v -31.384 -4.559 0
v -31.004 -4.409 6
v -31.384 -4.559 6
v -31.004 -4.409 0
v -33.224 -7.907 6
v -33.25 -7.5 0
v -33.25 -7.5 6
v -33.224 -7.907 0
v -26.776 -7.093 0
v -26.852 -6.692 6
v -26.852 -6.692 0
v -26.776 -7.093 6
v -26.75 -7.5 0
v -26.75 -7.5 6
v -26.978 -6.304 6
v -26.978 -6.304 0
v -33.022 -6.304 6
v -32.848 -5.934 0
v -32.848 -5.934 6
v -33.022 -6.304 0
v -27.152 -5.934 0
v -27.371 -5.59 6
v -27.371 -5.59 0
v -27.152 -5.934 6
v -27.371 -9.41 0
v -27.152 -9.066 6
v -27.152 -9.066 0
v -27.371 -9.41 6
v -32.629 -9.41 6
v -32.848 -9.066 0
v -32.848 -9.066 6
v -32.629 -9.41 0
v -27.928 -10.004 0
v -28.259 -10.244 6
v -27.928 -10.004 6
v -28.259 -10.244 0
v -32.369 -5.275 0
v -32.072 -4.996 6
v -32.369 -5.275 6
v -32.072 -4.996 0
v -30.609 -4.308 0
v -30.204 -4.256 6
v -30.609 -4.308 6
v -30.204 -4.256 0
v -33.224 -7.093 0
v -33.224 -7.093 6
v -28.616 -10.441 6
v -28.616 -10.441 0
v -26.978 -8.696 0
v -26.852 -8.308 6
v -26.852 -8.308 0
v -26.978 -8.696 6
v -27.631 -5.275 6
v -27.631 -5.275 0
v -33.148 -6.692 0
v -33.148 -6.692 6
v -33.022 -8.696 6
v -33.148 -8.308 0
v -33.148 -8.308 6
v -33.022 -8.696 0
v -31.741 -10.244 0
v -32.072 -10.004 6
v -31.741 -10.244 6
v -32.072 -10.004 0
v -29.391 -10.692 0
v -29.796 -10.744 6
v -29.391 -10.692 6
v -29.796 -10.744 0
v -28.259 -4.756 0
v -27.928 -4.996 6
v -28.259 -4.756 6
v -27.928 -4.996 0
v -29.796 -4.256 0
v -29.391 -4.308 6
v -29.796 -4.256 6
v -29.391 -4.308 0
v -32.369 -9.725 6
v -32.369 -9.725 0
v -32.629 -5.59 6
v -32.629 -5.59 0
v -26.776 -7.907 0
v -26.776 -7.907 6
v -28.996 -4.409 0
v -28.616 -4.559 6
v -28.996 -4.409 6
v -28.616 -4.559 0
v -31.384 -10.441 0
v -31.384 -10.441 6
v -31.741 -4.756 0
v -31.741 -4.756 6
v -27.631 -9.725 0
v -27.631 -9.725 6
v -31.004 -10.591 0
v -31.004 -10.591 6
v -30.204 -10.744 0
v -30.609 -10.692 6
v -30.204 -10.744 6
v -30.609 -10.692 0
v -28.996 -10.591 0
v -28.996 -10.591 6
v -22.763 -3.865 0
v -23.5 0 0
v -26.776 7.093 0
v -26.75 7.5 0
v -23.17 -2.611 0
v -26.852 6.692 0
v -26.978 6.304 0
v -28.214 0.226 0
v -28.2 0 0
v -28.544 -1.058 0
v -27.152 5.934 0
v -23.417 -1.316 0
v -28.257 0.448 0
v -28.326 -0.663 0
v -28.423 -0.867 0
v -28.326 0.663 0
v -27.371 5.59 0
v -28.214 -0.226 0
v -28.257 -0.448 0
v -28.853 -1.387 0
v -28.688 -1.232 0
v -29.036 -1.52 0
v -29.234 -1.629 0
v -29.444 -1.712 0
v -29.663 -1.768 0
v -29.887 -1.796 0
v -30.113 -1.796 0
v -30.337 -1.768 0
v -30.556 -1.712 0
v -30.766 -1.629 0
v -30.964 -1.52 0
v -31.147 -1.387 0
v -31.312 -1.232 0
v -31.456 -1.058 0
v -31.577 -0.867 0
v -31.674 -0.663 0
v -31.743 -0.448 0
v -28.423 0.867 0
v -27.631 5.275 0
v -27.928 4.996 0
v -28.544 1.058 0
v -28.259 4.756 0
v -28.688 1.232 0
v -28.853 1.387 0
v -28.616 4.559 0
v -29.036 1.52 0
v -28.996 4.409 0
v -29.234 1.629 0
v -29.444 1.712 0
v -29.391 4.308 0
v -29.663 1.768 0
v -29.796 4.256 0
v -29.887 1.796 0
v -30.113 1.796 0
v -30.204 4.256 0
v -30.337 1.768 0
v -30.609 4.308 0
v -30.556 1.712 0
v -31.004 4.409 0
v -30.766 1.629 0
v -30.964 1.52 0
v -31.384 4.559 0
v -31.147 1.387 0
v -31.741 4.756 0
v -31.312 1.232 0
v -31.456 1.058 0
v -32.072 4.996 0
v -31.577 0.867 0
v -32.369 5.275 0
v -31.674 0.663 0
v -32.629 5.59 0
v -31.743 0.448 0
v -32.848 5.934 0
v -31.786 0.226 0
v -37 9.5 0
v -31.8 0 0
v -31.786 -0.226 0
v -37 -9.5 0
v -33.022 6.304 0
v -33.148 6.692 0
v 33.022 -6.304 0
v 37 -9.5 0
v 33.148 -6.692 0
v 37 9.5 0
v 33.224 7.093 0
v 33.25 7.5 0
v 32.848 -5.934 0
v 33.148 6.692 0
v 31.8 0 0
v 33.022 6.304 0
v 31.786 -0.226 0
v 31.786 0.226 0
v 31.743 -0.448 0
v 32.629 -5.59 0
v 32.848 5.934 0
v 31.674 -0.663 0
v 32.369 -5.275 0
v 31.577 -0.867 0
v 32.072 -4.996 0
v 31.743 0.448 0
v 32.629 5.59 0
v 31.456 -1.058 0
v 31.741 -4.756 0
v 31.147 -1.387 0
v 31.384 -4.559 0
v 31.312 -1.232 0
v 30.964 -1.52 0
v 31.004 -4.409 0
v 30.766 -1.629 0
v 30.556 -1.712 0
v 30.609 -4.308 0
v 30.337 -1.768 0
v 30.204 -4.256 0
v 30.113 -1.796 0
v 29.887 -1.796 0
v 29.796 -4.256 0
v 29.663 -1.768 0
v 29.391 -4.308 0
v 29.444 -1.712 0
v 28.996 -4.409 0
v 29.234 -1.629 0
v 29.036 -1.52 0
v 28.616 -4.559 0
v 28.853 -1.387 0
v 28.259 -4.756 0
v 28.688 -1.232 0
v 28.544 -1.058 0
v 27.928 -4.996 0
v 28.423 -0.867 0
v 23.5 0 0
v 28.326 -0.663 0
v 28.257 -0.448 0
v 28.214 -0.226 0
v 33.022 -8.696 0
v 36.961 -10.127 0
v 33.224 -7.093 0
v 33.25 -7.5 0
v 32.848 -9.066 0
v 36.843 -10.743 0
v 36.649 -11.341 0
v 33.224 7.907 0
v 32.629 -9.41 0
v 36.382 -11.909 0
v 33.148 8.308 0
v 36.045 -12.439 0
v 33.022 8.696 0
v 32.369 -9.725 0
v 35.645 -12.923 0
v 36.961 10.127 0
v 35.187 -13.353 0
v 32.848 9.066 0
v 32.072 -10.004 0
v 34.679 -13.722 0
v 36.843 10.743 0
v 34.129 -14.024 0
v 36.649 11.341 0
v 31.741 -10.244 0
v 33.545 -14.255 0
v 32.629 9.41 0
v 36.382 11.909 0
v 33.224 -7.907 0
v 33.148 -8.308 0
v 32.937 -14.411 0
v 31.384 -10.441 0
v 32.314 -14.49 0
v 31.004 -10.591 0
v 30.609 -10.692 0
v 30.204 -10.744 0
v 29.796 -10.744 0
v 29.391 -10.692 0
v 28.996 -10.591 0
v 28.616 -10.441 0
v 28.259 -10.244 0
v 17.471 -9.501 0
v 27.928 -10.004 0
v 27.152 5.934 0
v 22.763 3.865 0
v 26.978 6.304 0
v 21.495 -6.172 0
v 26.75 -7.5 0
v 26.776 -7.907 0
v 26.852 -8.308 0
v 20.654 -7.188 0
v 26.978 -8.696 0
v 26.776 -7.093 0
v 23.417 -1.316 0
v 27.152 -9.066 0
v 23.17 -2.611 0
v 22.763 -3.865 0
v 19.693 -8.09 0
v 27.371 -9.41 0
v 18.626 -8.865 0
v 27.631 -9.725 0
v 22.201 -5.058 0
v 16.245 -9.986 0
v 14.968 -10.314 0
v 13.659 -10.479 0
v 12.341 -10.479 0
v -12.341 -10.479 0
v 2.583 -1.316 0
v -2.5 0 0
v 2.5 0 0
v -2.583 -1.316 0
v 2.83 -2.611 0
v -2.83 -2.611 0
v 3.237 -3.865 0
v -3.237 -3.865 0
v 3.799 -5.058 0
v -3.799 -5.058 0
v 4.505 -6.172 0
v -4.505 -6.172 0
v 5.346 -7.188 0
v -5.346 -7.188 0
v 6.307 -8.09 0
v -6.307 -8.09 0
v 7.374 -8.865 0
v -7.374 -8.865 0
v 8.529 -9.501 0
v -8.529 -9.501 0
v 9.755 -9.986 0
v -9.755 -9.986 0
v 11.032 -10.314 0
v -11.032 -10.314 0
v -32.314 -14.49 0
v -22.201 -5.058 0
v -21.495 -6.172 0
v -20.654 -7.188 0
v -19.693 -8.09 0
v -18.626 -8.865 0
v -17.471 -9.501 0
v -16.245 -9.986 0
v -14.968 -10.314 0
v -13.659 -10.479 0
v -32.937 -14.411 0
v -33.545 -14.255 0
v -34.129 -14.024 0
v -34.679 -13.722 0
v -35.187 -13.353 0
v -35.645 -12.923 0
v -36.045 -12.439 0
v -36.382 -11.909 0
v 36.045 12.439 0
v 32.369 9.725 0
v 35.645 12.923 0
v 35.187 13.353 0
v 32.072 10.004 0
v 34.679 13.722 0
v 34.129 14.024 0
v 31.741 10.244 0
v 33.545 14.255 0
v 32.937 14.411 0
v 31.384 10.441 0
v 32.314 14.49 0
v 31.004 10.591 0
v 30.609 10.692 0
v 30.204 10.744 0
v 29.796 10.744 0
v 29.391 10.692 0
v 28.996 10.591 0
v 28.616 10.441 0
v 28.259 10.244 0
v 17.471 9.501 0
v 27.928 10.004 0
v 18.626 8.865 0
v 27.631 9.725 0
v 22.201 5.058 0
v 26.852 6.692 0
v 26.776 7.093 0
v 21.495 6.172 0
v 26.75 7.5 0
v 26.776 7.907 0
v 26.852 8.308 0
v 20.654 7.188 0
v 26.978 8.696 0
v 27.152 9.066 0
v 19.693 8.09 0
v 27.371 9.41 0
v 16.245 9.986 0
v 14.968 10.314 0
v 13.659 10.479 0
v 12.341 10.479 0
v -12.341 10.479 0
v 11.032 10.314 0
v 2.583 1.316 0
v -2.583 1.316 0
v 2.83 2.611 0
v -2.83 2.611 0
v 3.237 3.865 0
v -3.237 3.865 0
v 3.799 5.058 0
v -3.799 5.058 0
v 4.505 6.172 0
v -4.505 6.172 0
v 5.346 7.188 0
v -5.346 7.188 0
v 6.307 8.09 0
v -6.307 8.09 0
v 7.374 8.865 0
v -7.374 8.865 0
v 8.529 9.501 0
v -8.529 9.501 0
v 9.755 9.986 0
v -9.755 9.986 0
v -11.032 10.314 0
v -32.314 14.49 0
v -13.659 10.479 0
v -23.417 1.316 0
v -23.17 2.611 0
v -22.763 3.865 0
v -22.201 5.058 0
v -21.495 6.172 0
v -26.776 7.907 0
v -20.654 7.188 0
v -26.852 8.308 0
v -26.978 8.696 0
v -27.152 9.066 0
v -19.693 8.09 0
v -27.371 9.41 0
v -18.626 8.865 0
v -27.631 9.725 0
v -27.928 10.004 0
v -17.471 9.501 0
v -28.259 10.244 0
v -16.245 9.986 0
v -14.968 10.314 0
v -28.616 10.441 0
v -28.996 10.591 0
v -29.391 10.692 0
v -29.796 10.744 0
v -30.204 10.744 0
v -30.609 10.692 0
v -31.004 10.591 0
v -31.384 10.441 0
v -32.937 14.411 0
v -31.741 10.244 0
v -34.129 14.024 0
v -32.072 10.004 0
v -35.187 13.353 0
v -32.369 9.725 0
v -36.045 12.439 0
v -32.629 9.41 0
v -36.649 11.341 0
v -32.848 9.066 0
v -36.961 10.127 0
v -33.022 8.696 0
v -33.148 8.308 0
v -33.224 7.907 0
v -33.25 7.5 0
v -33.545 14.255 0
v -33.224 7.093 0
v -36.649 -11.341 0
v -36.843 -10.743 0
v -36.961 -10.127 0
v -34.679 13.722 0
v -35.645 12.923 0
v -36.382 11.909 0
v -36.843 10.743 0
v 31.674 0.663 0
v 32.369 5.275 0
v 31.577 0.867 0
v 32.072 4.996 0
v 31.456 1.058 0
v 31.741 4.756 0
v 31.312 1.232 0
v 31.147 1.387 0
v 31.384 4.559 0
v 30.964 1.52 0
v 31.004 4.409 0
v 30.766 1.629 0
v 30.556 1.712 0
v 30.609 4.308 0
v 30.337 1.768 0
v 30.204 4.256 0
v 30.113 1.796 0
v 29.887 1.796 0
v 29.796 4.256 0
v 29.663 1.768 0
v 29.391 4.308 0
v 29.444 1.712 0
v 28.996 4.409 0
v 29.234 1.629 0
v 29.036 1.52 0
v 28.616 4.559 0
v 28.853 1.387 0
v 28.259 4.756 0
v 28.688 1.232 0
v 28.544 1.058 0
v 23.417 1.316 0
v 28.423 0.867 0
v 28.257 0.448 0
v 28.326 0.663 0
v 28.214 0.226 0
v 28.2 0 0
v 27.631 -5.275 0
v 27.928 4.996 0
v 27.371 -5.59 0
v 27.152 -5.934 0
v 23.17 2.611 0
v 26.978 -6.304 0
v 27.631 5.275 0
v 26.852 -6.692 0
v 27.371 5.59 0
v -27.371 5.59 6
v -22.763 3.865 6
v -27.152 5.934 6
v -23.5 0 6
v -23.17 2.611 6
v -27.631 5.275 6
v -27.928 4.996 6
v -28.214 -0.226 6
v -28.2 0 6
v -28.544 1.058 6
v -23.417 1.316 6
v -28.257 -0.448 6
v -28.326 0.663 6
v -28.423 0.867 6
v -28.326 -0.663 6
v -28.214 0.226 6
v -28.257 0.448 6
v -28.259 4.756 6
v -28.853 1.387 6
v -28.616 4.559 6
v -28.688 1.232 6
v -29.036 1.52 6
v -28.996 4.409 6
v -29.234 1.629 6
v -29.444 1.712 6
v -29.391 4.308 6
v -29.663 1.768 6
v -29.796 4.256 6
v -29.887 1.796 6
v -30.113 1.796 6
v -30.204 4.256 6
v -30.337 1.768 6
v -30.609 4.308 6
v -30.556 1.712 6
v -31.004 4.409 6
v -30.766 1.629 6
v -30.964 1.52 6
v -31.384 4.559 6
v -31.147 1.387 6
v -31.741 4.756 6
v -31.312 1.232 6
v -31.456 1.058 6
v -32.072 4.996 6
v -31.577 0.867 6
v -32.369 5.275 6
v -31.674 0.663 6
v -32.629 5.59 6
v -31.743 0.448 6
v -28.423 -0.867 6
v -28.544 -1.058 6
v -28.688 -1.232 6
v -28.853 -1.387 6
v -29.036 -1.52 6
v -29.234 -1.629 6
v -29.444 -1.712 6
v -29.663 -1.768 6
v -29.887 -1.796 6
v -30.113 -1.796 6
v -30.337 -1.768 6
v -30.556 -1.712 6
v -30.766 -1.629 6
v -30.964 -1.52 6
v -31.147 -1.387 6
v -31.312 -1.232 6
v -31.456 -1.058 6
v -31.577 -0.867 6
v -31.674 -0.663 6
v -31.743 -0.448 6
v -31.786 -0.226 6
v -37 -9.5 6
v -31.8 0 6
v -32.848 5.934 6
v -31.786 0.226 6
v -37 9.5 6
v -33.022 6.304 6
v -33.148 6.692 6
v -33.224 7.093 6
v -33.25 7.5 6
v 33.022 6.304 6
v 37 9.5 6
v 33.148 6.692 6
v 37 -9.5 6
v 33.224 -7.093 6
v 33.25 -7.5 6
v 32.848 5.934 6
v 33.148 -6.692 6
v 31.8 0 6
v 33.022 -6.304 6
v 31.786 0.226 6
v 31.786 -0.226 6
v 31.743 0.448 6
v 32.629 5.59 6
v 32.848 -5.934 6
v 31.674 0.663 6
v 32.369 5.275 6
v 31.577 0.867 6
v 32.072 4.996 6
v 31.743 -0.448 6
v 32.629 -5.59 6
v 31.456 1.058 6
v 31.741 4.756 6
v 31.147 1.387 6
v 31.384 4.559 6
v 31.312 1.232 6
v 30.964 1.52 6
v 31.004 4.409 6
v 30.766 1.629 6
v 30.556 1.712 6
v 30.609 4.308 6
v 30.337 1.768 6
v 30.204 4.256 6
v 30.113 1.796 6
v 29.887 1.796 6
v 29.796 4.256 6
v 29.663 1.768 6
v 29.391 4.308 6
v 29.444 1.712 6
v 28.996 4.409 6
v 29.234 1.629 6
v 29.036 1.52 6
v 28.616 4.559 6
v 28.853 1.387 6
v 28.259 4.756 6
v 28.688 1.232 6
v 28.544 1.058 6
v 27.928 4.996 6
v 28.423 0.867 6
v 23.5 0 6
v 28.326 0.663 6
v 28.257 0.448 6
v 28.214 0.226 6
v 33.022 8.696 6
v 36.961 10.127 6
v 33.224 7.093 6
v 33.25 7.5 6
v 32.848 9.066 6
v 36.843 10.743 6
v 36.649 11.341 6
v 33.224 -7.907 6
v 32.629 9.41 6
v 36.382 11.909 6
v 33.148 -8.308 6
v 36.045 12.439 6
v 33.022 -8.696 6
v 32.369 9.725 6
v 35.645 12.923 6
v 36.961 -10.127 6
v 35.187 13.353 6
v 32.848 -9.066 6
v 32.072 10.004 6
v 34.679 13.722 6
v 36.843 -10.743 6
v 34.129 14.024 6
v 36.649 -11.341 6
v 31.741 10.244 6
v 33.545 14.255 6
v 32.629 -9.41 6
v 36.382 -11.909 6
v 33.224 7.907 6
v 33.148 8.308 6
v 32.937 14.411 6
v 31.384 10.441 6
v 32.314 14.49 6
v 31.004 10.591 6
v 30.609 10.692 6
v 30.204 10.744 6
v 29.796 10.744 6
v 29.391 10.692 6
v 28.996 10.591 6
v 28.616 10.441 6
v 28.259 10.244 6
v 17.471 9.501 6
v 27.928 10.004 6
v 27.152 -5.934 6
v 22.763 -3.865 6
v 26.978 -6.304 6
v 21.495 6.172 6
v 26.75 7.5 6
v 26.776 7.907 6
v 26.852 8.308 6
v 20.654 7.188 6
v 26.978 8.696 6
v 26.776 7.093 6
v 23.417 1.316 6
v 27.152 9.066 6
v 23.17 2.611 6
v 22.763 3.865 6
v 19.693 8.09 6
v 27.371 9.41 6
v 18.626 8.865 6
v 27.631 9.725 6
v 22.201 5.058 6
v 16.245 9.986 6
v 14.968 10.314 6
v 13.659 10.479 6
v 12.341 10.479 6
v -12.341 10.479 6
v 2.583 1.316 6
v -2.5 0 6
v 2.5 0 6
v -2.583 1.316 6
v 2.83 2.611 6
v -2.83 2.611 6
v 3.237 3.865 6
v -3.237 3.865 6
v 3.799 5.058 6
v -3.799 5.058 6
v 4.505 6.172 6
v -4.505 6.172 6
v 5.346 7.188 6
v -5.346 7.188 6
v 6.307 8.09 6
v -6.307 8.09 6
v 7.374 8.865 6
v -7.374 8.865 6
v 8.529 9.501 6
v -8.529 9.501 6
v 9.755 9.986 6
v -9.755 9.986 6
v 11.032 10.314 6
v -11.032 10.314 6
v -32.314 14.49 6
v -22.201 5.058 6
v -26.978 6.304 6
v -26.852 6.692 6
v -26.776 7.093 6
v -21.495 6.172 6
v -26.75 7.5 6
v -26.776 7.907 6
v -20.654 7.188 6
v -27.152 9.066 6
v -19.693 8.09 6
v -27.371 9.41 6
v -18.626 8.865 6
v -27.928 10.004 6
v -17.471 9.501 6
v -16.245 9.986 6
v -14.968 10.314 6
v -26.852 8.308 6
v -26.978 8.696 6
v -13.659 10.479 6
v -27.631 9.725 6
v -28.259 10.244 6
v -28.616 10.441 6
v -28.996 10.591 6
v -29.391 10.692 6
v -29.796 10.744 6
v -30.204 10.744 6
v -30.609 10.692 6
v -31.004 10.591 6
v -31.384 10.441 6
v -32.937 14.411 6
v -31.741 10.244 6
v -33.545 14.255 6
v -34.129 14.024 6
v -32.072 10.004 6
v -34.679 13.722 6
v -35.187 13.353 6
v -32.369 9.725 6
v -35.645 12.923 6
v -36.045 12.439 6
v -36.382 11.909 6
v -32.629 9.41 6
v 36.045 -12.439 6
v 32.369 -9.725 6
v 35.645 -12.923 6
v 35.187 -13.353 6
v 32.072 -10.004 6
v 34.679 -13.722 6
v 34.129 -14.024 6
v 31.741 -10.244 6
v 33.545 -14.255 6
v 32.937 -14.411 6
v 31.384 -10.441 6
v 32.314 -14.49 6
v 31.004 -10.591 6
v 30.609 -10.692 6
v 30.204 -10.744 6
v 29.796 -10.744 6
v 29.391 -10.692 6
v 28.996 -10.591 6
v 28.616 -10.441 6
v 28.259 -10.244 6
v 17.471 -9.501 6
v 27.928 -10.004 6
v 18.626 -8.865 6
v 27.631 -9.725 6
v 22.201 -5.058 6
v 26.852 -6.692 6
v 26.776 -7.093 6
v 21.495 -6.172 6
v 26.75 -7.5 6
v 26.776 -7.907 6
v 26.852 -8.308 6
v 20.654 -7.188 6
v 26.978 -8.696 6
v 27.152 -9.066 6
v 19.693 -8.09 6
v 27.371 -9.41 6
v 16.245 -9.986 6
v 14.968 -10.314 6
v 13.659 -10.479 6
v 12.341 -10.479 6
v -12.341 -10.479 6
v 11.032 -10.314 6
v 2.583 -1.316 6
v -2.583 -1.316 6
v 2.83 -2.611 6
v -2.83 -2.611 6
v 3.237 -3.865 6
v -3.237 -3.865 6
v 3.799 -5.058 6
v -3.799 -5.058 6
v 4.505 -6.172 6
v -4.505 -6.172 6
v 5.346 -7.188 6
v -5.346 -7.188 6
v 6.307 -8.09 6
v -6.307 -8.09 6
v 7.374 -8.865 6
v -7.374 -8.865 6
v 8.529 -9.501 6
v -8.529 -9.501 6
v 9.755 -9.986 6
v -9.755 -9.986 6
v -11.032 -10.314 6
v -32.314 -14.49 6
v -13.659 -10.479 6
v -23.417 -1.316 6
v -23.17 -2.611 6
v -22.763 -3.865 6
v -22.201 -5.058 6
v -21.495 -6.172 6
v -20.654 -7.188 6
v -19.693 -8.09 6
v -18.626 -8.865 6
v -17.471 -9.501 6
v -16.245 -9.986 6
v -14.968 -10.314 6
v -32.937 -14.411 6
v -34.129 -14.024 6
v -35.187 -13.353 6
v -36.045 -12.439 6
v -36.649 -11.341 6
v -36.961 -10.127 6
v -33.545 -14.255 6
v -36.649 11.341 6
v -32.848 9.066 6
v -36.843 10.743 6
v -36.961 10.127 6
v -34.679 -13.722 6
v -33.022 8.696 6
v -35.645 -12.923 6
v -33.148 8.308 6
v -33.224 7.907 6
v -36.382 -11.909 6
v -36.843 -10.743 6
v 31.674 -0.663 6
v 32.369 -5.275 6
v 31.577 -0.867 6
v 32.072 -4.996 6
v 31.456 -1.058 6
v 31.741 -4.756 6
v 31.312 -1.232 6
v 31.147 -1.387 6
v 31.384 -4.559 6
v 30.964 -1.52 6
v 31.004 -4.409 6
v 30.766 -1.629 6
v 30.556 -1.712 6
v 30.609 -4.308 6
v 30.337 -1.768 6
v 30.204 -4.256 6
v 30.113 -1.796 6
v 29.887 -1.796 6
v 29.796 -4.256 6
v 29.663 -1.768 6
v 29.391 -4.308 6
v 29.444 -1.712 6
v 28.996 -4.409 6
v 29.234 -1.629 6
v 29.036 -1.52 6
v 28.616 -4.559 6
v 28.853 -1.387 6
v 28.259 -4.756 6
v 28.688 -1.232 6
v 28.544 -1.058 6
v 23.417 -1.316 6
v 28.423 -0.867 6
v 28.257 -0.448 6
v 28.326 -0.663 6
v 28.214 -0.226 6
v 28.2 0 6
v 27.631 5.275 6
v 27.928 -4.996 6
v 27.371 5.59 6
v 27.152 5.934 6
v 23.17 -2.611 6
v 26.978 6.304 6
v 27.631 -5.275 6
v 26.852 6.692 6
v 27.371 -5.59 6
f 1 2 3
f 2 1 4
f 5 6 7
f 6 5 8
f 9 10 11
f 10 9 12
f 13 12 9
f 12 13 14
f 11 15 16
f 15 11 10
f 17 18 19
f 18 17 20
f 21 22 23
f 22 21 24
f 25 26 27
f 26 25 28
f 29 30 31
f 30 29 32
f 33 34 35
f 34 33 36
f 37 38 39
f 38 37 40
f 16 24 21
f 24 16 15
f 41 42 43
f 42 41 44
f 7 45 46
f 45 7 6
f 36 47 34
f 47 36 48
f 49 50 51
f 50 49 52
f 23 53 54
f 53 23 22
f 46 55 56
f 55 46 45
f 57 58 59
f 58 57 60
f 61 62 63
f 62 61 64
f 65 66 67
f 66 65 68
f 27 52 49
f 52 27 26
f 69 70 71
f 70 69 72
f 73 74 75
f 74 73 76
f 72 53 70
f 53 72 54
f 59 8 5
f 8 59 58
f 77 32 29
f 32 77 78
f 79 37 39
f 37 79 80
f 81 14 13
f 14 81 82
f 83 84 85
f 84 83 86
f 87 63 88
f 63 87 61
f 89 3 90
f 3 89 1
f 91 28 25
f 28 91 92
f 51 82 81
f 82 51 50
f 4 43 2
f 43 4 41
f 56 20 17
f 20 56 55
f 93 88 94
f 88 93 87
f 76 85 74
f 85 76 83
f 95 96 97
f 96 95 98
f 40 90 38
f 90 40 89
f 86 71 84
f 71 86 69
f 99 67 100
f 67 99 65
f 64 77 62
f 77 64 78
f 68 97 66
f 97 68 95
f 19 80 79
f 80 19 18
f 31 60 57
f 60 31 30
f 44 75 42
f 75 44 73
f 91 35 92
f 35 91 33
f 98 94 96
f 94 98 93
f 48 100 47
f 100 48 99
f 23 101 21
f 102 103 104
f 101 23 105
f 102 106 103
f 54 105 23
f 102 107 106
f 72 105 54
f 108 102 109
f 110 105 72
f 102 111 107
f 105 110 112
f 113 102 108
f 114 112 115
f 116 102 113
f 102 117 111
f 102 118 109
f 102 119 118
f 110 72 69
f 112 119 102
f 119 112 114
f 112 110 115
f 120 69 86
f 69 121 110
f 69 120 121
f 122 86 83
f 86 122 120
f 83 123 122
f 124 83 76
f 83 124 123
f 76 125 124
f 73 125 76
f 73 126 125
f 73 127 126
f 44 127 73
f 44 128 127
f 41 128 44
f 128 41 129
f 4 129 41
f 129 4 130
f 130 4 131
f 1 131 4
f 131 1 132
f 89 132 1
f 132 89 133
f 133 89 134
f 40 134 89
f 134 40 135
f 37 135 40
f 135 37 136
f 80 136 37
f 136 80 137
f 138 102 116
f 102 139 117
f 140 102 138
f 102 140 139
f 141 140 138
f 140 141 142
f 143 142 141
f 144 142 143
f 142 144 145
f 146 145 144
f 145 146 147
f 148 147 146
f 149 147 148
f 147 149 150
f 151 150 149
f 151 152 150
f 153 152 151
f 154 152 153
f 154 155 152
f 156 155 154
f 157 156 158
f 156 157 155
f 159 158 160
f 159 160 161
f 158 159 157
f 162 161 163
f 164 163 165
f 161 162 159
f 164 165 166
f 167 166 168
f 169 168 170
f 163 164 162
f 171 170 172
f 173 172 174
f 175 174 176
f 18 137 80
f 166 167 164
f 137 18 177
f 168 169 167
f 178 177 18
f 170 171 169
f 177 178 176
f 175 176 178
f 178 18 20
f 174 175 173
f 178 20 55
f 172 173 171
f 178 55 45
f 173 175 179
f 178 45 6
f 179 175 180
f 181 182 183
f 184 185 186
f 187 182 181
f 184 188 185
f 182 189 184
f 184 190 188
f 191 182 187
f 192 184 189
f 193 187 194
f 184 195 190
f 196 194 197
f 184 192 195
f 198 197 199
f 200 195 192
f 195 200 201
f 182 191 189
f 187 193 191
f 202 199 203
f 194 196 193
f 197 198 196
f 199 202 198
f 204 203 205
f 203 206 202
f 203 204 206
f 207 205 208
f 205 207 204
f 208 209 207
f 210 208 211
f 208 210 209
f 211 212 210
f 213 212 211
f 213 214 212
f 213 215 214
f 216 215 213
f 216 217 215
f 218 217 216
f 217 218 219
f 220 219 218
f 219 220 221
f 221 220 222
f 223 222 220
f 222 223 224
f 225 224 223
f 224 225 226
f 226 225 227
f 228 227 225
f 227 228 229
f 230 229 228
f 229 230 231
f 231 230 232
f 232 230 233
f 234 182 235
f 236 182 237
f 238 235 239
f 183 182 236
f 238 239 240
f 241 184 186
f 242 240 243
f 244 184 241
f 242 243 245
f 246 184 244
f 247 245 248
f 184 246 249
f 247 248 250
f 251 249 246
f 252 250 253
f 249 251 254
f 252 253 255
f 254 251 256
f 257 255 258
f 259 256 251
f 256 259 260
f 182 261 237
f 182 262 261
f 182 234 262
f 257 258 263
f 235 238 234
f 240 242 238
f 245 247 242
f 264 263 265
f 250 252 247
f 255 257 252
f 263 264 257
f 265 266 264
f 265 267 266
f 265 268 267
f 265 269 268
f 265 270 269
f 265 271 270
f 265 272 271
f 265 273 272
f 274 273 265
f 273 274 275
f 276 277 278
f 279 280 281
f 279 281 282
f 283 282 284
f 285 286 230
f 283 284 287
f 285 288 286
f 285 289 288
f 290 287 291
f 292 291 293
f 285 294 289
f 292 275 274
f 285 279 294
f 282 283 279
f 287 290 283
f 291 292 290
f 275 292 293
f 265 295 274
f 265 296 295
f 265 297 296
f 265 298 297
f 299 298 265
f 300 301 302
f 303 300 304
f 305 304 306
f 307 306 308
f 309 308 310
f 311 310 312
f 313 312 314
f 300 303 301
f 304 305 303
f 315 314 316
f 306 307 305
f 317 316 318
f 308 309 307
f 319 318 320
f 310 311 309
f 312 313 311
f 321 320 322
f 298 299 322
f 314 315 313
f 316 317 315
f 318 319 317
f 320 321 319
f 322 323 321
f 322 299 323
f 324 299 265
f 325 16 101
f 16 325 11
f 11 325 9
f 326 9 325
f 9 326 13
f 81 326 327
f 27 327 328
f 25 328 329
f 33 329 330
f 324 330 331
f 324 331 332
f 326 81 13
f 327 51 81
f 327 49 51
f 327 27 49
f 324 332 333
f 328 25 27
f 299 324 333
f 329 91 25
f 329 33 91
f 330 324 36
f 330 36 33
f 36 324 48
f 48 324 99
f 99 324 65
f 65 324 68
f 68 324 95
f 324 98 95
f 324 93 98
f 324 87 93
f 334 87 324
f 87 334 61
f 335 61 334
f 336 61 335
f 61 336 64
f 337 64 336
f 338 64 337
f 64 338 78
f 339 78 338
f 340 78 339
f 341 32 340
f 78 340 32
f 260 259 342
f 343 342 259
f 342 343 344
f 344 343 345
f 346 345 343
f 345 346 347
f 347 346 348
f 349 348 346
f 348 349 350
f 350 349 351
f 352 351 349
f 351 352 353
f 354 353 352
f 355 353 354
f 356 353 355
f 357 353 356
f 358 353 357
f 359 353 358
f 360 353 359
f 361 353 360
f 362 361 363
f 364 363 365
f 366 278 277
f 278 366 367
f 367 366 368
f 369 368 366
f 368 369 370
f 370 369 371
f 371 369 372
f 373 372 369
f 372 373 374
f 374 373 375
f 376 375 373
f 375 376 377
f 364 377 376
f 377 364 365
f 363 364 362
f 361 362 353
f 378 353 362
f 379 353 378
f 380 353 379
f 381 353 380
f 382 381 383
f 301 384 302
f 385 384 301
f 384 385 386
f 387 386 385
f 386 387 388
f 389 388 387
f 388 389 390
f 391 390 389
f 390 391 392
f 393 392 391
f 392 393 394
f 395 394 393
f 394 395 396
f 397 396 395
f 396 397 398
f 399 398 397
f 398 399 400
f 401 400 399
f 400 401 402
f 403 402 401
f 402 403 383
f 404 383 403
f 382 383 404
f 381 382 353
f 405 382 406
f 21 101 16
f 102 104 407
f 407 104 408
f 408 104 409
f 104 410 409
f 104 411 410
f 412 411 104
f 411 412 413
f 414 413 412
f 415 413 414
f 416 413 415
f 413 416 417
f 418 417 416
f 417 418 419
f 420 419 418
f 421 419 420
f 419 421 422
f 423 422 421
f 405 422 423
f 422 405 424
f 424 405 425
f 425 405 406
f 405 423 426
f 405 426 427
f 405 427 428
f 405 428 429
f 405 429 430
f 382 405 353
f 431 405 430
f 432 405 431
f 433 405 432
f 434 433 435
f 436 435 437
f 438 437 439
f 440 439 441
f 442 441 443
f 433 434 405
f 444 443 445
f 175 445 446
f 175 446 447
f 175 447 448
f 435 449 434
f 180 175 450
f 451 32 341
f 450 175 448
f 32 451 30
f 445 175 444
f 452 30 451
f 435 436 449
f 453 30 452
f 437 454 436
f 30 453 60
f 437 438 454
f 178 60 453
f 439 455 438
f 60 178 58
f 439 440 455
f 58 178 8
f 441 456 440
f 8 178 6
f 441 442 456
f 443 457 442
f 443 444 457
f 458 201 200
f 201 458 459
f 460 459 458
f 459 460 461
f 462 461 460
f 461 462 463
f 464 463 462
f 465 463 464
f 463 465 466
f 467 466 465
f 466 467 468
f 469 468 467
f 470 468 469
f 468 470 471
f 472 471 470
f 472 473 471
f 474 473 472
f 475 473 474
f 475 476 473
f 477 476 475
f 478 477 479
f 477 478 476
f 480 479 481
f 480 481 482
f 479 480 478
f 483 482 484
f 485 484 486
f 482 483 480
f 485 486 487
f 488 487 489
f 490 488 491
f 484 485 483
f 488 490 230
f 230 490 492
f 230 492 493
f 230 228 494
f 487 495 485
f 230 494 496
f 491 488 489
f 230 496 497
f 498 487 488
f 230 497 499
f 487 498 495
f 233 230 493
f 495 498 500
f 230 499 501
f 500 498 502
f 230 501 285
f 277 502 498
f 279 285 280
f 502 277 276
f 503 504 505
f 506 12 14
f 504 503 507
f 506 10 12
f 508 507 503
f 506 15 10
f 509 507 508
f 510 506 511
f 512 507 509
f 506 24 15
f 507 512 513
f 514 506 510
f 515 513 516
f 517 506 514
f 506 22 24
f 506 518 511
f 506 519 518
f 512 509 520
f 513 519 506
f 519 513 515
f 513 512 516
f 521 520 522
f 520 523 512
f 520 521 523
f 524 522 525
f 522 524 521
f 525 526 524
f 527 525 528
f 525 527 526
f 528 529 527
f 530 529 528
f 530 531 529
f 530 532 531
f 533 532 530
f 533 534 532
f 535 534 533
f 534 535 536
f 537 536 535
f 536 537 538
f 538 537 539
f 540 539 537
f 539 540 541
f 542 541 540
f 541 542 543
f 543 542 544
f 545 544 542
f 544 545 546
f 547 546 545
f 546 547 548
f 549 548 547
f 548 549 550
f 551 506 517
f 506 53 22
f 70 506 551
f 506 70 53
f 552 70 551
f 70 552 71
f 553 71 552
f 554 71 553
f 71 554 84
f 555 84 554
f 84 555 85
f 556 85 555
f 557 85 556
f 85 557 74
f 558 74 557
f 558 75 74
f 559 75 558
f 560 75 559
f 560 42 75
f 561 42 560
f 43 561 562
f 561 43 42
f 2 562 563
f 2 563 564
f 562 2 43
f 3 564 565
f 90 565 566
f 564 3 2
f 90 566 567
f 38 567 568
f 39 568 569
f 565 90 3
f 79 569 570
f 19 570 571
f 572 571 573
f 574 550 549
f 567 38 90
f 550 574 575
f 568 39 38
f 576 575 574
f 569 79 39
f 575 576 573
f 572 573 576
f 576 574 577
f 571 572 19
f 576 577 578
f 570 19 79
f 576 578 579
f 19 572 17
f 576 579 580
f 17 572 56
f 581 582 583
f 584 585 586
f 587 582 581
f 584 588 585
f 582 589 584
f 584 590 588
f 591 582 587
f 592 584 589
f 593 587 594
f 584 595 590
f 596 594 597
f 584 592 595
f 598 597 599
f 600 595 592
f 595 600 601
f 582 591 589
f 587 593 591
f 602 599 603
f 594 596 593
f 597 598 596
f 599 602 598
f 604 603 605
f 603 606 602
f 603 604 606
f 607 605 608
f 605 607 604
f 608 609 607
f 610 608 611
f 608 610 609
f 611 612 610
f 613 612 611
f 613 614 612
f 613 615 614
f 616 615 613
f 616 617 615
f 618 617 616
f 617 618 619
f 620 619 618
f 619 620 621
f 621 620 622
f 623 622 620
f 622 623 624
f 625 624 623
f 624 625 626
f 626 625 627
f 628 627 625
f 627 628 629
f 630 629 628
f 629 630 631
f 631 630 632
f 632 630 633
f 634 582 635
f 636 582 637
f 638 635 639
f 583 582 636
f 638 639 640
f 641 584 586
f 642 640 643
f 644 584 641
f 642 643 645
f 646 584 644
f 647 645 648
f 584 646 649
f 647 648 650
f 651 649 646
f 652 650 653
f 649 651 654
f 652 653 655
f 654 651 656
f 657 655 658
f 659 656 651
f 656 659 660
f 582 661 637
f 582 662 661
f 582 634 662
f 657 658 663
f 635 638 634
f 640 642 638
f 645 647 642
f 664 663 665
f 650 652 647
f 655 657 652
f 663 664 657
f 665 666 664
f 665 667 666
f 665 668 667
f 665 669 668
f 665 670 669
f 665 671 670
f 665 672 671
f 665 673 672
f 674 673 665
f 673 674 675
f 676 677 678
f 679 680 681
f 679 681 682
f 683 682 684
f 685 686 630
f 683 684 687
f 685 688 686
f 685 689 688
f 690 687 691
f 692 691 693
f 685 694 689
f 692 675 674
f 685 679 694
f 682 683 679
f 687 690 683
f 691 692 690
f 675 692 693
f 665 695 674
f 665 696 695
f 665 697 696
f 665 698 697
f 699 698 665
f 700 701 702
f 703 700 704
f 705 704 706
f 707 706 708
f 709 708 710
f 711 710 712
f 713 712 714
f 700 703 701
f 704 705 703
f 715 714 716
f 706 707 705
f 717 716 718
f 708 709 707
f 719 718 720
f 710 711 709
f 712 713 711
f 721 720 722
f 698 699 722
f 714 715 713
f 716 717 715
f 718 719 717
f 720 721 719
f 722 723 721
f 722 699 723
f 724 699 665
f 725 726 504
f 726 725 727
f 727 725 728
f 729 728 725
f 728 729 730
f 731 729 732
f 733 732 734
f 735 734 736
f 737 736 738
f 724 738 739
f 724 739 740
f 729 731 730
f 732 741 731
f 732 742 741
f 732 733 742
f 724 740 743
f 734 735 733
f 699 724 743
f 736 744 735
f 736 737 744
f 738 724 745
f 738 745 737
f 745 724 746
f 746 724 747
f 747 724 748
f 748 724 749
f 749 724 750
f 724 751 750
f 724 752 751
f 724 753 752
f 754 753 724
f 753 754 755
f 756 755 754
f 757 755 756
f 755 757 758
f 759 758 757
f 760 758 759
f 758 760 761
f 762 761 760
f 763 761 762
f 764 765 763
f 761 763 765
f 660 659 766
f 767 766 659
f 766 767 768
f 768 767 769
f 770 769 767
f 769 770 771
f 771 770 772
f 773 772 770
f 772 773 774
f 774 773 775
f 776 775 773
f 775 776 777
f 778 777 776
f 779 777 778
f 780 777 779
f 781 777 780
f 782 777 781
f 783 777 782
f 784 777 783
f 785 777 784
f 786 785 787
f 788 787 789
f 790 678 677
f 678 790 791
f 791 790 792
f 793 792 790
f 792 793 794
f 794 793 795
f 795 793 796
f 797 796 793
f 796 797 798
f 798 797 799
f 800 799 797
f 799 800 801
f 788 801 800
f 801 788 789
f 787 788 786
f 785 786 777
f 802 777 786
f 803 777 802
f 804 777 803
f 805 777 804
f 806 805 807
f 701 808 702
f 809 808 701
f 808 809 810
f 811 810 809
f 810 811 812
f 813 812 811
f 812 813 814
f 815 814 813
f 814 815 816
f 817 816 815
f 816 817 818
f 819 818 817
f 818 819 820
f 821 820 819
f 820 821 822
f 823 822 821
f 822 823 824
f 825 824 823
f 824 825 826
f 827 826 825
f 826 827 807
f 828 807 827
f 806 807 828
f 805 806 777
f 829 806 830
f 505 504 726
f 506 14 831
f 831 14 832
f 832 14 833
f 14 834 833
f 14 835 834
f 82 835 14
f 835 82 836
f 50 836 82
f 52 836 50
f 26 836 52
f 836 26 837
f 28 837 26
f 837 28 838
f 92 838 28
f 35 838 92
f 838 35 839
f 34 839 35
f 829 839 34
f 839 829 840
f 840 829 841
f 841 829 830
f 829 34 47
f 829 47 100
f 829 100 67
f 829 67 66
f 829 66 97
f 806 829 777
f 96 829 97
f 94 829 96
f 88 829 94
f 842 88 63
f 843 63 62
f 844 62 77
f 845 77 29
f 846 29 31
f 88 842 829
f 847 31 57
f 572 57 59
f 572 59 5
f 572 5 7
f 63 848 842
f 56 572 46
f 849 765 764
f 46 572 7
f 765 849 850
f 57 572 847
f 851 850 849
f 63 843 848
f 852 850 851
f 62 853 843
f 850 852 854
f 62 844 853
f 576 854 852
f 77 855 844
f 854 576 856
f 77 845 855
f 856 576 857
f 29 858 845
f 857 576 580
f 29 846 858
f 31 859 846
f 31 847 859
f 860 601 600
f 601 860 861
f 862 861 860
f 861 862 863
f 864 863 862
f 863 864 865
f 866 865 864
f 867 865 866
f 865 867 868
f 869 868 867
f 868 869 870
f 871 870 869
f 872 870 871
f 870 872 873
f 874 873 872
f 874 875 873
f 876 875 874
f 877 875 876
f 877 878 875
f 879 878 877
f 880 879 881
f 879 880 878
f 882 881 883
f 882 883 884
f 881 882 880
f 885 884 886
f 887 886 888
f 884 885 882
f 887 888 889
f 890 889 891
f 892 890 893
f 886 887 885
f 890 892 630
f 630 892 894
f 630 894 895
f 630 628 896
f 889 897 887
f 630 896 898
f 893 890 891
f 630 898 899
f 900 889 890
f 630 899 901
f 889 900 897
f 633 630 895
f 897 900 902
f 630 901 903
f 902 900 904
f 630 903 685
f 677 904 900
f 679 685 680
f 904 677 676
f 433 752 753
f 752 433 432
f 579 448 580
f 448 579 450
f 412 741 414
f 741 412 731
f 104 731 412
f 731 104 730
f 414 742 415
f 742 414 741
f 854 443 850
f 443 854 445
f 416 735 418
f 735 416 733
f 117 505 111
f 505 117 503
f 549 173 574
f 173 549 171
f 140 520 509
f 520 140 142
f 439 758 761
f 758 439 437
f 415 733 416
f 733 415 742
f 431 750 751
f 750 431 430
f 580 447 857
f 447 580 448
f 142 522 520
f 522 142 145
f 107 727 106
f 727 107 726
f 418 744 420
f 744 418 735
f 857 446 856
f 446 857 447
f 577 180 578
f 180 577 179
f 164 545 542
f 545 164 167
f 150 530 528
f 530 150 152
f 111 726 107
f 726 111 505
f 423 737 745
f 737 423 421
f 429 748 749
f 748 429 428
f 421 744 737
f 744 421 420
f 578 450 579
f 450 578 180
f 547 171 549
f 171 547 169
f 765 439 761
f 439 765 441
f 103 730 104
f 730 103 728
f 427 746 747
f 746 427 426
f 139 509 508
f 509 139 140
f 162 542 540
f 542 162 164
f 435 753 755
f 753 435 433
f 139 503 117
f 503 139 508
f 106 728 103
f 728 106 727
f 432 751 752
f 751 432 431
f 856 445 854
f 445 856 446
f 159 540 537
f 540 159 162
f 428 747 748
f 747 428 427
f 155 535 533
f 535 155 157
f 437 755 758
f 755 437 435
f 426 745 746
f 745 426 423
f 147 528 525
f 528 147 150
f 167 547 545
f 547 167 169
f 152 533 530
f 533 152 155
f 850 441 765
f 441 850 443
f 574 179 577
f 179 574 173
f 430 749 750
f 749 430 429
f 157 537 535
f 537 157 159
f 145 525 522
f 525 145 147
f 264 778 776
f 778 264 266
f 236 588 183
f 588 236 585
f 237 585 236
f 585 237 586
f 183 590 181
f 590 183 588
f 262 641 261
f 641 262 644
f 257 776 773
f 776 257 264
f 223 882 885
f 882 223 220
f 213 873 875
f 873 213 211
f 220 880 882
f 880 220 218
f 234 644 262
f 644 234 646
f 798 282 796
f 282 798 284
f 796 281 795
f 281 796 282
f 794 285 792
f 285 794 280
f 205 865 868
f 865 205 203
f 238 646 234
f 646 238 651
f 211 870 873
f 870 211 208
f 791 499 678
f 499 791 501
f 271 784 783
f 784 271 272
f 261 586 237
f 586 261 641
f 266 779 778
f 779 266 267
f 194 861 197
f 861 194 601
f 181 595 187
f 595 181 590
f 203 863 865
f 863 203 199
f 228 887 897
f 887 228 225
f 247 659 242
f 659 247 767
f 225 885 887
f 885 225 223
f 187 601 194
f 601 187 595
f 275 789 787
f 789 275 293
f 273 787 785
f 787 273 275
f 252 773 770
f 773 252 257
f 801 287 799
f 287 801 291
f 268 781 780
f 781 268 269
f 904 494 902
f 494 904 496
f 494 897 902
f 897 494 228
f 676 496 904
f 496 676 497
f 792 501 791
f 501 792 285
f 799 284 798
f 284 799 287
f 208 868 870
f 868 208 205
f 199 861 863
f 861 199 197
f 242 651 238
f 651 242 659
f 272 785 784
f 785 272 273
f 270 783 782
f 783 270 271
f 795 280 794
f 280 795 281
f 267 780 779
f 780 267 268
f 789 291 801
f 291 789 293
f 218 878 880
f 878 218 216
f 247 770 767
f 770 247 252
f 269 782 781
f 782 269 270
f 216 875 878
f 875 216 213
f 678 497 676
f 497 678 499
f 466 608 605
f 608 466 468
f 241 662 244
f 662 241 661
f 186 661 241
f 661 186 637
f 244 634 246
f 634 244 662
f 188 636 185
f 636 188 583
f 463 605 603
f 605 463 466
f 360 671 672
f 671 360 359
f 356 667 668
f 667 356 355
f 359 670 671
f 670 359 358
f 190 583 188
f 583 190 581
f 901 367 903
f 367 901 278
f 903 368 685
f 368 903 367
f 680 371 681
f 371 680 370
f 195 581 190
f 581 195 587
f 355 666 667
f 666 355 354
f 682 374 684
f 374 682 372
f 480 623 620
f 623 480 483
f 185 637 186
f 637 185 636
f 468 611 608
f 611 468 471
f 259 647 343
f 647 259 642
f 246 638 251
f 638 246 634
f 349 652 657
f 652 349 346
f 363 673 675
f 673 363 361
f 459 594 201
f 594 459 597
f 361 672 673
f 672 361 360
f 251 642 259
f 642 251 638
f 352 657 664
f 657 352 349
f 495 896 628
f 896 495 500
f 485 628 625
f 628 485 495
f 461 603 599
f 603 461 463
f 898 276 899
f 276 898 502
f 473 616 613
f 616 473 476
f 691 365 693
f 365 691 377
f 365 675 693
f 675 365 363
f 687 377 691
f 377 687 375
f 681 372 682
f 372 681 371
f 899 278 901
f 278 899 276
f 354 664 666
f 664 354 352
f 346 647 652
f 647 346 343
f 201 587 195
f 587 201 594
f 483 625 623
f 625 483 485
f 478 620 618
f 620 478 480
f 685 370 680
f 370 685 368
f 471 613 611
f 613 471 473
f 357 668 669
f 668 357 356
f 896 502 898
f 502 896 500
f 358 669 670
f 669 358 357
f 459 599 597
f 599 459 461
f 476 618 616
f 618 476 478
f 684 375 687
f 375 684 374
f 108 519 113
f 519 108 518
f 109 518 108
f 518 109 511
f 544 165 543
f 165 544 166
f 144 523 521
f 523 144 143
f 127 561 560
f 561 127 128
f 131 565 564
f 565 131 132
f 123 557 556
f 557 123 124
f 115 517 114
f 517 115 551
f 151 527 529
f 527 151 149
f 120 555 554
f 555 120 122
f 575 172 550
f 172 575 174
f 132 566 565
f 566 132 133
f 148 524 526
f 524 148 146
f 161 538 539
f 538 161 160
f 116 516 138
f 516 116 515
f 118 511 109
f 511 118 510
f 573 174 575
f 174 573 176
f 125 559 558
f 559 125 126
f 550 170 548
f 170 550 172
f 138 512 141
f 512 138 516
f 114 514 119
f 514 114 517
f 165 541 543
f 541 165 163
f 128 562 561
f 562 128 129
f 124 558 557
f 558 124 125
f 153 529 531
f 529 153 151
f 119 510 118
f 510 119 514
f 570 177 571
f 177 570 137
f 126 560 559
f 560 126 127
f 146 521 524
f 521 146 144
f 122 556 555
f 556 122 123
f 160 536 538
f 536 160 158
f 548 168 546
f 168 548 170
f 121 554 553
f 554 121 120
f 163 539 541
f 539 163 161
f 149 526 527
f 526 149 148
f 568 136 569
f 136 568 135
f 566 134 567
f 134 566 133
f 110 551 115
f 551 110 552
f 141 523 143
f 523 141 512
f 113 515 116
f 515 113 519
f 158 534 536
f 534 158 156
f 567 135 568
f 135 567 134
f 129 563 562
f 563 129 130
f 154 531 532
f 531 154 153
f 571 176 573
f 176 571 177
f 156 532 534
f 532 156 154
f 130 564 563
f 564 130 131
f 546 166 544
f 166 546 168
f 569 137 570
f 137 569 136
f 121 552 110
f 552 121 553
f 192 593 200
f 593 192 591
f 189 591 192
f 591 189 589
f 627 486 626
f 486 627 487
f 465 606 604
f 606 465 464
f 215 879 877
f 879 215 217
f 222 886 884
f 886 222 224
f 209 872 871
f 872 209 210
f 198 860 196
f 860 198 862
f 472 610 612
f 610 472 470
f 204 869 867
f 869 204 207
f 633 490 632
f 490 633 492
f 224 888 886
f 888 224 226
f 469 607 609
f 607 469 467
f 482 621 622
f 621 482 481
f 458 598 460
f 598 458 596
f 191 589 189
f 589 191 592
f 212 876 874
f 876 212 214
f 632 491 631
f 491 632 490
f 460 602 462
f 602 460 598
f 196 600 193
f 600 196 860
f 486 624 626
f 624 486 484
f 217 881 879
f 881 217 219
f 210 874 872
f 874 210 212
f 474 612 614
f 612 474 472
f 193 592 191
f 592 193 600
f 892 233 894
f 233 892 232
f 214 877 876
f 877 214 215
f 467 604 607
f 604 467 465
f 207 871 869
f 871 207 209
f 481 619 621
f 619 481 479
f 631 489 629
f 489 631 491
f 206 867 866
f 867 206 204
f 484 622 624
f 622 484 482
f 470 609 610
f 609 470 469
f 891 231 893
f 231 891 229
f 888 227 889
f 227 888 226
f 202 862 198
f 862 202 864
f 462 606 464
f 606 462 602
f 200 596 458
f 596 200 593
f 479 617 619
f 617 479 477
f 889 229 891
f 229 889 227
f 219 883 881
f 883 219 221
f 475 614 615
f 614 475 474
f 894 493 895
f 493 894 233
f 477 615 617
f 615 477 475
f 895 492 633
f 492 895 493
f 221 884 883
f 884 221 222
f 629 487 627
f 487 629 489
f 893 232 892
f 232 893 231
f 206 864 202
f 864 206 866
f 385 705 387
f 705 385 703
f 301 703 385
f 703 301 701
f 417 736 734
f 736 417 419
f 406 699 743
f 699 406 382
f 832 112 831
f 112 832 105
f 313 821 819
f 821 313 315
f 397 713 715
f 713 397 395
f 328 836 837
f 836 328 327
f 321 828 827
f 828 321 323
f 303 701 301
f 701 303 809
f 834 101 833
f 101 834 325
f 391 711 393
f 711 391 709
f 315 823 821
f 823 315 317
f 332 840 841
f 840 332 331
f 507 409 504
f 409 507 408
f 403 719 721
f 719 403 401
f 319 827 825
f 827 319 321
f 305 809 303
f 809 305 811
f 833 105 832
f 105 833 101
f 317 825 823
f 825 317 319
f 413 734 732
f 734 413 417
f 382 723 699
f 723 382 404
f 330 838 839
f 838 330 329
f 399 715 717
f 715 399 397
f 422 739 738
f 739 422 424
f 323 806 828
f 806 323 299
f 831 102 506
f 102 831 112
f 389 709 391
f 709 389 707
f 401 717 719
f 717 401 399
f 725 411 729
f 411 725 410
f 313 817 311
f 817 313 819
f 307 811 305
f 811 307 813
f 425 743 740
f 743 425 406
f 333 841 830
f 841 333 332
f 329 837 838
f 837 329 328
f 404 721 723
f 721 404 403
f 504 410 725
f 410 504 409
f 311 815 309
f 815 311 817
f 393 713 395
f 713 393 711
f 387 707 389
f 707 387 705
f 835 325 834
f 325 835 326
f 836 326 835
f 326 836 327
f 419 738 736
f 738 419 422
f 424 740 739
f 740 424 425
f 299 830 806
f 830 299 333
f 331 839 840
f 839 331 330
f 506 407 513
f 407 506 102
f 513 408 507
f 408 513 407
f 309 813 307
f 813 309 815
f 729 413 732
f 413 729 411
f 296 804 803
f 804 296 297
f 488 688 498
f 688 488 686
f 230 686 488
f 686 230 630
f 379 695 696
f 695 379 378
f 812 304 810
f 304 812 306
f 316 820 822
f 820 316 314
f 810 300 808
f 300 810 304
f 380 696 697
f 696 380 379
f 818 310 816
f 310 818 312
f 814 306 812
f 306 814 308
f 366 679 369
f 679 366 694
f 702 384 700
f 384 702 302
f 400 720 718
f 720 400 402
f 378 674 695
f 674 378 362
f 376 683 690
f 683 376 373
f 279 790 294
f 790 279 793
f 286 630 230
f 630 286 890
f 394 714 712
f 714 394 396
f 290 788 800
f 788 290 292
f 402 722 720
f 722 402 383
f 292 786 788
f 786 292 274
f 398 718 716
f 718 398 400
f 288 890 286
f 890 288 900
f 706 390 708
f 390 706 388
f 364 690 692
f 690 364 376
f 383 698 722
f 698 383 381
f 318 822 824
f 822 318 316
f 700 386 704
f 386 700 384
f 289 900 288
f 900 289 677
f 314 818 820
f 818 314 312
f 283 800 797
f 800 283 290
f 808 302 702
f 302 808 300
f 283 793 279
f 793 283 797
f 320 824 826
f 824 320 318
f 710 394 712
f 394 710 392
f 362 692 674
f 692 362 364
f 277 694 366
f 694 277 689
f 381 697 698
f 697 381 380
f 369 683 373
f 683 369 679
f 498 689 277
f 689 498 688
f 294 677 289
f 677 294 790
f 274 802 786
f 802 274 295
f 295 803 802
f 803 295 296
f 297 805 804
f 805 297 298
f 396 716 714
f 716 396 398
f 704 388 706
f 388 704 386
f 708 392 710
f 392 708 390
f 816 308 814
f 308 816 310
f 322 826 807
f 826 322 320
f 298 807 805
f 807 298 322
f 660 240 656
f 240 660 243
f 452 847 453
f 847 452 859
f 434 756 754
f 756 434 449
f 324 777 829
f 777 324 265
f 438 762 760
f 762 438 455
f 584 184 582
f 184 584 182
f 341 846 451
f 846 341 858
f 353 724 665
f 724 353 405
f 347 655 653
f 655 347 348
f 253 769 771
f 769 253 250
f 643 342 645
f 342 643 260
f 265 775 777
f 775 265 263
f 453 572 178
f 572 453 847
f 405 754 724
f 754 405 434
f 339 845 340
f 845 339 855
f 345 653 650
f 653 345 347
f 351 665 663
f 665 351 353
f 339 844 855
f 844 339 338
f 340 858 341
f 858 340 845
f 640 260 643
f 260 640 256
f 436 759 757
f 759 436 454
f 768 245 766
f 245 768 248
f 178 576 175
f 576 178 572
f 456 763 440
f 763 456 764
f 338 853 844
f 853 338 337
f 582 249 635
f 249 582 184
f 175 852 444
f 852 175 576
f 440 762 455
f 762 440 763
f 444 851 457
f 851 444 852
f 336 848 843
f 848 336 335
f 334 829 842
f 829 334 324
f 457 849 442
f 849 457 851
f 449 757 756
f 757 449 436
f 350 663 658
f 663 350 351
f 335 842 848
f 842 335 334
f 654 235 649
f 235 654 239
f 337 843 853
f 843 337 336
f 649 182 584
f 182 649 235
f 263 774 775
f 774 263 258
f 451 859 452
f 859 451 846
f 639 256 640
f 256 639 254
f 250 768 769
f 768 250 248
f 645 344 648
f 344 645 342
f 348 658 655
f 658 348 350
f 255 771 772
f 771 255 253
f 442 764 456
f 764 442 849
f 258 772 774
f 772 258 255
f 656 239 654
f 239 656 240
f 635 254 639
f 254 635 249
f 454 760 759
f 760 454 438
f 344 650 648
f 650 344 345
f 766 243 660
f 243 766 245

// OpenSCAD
$fn = 50;

difference() {
	union() {
		hull() {
			translate(v = [-32.0, 9.5, 0]) {
				cylinder(h = 6, r = 5);
			}
			translate(v = [32.0, 9.5, 0]) {
				cylinder(h = 6, r = 5);
			}
			translate(v = [-32.0, -9.5, 0]) {
				cylinder(h = 6, r = 5);
			}
			translate(v = [32.0, -9.5, 0]) {
				cylinder(h = 6, r = 5);
			}
		}
	}
	union() {
		translate(v = [-30.0, -7.5, 0]) {
			cylinder(h = 6, r = 3.25);
		}
		translate(v = [-30.0, 7.5, 0]) {
			cylinder(h = 6, r = 3.25);
		}
		translate(v = [30.0, -7.5, 0]) {
			cylinder(h = 6, r = 3.25);
		}
		translate(v = [30.0, 7.5, 0]) {
			cylinder(h = 6, r = 3.25);
		}
		translate(v = [-30.0, 0.0, 0]) {
			cylinder(h = 6, r = 1.8);
		}
		translate(v = [30.0, 0.0, 0]) {
			cylinder(h = 6, r = 1.8);
		}
		translate(v = [-13.0, 0, 0.0]) {
			cylinder(h = 6, r = 10.5);
		}
		translate(v = [13.0, 0, 0.0]) {
			cylinder(h = 6, r = 10.5);
		}
	}
}
